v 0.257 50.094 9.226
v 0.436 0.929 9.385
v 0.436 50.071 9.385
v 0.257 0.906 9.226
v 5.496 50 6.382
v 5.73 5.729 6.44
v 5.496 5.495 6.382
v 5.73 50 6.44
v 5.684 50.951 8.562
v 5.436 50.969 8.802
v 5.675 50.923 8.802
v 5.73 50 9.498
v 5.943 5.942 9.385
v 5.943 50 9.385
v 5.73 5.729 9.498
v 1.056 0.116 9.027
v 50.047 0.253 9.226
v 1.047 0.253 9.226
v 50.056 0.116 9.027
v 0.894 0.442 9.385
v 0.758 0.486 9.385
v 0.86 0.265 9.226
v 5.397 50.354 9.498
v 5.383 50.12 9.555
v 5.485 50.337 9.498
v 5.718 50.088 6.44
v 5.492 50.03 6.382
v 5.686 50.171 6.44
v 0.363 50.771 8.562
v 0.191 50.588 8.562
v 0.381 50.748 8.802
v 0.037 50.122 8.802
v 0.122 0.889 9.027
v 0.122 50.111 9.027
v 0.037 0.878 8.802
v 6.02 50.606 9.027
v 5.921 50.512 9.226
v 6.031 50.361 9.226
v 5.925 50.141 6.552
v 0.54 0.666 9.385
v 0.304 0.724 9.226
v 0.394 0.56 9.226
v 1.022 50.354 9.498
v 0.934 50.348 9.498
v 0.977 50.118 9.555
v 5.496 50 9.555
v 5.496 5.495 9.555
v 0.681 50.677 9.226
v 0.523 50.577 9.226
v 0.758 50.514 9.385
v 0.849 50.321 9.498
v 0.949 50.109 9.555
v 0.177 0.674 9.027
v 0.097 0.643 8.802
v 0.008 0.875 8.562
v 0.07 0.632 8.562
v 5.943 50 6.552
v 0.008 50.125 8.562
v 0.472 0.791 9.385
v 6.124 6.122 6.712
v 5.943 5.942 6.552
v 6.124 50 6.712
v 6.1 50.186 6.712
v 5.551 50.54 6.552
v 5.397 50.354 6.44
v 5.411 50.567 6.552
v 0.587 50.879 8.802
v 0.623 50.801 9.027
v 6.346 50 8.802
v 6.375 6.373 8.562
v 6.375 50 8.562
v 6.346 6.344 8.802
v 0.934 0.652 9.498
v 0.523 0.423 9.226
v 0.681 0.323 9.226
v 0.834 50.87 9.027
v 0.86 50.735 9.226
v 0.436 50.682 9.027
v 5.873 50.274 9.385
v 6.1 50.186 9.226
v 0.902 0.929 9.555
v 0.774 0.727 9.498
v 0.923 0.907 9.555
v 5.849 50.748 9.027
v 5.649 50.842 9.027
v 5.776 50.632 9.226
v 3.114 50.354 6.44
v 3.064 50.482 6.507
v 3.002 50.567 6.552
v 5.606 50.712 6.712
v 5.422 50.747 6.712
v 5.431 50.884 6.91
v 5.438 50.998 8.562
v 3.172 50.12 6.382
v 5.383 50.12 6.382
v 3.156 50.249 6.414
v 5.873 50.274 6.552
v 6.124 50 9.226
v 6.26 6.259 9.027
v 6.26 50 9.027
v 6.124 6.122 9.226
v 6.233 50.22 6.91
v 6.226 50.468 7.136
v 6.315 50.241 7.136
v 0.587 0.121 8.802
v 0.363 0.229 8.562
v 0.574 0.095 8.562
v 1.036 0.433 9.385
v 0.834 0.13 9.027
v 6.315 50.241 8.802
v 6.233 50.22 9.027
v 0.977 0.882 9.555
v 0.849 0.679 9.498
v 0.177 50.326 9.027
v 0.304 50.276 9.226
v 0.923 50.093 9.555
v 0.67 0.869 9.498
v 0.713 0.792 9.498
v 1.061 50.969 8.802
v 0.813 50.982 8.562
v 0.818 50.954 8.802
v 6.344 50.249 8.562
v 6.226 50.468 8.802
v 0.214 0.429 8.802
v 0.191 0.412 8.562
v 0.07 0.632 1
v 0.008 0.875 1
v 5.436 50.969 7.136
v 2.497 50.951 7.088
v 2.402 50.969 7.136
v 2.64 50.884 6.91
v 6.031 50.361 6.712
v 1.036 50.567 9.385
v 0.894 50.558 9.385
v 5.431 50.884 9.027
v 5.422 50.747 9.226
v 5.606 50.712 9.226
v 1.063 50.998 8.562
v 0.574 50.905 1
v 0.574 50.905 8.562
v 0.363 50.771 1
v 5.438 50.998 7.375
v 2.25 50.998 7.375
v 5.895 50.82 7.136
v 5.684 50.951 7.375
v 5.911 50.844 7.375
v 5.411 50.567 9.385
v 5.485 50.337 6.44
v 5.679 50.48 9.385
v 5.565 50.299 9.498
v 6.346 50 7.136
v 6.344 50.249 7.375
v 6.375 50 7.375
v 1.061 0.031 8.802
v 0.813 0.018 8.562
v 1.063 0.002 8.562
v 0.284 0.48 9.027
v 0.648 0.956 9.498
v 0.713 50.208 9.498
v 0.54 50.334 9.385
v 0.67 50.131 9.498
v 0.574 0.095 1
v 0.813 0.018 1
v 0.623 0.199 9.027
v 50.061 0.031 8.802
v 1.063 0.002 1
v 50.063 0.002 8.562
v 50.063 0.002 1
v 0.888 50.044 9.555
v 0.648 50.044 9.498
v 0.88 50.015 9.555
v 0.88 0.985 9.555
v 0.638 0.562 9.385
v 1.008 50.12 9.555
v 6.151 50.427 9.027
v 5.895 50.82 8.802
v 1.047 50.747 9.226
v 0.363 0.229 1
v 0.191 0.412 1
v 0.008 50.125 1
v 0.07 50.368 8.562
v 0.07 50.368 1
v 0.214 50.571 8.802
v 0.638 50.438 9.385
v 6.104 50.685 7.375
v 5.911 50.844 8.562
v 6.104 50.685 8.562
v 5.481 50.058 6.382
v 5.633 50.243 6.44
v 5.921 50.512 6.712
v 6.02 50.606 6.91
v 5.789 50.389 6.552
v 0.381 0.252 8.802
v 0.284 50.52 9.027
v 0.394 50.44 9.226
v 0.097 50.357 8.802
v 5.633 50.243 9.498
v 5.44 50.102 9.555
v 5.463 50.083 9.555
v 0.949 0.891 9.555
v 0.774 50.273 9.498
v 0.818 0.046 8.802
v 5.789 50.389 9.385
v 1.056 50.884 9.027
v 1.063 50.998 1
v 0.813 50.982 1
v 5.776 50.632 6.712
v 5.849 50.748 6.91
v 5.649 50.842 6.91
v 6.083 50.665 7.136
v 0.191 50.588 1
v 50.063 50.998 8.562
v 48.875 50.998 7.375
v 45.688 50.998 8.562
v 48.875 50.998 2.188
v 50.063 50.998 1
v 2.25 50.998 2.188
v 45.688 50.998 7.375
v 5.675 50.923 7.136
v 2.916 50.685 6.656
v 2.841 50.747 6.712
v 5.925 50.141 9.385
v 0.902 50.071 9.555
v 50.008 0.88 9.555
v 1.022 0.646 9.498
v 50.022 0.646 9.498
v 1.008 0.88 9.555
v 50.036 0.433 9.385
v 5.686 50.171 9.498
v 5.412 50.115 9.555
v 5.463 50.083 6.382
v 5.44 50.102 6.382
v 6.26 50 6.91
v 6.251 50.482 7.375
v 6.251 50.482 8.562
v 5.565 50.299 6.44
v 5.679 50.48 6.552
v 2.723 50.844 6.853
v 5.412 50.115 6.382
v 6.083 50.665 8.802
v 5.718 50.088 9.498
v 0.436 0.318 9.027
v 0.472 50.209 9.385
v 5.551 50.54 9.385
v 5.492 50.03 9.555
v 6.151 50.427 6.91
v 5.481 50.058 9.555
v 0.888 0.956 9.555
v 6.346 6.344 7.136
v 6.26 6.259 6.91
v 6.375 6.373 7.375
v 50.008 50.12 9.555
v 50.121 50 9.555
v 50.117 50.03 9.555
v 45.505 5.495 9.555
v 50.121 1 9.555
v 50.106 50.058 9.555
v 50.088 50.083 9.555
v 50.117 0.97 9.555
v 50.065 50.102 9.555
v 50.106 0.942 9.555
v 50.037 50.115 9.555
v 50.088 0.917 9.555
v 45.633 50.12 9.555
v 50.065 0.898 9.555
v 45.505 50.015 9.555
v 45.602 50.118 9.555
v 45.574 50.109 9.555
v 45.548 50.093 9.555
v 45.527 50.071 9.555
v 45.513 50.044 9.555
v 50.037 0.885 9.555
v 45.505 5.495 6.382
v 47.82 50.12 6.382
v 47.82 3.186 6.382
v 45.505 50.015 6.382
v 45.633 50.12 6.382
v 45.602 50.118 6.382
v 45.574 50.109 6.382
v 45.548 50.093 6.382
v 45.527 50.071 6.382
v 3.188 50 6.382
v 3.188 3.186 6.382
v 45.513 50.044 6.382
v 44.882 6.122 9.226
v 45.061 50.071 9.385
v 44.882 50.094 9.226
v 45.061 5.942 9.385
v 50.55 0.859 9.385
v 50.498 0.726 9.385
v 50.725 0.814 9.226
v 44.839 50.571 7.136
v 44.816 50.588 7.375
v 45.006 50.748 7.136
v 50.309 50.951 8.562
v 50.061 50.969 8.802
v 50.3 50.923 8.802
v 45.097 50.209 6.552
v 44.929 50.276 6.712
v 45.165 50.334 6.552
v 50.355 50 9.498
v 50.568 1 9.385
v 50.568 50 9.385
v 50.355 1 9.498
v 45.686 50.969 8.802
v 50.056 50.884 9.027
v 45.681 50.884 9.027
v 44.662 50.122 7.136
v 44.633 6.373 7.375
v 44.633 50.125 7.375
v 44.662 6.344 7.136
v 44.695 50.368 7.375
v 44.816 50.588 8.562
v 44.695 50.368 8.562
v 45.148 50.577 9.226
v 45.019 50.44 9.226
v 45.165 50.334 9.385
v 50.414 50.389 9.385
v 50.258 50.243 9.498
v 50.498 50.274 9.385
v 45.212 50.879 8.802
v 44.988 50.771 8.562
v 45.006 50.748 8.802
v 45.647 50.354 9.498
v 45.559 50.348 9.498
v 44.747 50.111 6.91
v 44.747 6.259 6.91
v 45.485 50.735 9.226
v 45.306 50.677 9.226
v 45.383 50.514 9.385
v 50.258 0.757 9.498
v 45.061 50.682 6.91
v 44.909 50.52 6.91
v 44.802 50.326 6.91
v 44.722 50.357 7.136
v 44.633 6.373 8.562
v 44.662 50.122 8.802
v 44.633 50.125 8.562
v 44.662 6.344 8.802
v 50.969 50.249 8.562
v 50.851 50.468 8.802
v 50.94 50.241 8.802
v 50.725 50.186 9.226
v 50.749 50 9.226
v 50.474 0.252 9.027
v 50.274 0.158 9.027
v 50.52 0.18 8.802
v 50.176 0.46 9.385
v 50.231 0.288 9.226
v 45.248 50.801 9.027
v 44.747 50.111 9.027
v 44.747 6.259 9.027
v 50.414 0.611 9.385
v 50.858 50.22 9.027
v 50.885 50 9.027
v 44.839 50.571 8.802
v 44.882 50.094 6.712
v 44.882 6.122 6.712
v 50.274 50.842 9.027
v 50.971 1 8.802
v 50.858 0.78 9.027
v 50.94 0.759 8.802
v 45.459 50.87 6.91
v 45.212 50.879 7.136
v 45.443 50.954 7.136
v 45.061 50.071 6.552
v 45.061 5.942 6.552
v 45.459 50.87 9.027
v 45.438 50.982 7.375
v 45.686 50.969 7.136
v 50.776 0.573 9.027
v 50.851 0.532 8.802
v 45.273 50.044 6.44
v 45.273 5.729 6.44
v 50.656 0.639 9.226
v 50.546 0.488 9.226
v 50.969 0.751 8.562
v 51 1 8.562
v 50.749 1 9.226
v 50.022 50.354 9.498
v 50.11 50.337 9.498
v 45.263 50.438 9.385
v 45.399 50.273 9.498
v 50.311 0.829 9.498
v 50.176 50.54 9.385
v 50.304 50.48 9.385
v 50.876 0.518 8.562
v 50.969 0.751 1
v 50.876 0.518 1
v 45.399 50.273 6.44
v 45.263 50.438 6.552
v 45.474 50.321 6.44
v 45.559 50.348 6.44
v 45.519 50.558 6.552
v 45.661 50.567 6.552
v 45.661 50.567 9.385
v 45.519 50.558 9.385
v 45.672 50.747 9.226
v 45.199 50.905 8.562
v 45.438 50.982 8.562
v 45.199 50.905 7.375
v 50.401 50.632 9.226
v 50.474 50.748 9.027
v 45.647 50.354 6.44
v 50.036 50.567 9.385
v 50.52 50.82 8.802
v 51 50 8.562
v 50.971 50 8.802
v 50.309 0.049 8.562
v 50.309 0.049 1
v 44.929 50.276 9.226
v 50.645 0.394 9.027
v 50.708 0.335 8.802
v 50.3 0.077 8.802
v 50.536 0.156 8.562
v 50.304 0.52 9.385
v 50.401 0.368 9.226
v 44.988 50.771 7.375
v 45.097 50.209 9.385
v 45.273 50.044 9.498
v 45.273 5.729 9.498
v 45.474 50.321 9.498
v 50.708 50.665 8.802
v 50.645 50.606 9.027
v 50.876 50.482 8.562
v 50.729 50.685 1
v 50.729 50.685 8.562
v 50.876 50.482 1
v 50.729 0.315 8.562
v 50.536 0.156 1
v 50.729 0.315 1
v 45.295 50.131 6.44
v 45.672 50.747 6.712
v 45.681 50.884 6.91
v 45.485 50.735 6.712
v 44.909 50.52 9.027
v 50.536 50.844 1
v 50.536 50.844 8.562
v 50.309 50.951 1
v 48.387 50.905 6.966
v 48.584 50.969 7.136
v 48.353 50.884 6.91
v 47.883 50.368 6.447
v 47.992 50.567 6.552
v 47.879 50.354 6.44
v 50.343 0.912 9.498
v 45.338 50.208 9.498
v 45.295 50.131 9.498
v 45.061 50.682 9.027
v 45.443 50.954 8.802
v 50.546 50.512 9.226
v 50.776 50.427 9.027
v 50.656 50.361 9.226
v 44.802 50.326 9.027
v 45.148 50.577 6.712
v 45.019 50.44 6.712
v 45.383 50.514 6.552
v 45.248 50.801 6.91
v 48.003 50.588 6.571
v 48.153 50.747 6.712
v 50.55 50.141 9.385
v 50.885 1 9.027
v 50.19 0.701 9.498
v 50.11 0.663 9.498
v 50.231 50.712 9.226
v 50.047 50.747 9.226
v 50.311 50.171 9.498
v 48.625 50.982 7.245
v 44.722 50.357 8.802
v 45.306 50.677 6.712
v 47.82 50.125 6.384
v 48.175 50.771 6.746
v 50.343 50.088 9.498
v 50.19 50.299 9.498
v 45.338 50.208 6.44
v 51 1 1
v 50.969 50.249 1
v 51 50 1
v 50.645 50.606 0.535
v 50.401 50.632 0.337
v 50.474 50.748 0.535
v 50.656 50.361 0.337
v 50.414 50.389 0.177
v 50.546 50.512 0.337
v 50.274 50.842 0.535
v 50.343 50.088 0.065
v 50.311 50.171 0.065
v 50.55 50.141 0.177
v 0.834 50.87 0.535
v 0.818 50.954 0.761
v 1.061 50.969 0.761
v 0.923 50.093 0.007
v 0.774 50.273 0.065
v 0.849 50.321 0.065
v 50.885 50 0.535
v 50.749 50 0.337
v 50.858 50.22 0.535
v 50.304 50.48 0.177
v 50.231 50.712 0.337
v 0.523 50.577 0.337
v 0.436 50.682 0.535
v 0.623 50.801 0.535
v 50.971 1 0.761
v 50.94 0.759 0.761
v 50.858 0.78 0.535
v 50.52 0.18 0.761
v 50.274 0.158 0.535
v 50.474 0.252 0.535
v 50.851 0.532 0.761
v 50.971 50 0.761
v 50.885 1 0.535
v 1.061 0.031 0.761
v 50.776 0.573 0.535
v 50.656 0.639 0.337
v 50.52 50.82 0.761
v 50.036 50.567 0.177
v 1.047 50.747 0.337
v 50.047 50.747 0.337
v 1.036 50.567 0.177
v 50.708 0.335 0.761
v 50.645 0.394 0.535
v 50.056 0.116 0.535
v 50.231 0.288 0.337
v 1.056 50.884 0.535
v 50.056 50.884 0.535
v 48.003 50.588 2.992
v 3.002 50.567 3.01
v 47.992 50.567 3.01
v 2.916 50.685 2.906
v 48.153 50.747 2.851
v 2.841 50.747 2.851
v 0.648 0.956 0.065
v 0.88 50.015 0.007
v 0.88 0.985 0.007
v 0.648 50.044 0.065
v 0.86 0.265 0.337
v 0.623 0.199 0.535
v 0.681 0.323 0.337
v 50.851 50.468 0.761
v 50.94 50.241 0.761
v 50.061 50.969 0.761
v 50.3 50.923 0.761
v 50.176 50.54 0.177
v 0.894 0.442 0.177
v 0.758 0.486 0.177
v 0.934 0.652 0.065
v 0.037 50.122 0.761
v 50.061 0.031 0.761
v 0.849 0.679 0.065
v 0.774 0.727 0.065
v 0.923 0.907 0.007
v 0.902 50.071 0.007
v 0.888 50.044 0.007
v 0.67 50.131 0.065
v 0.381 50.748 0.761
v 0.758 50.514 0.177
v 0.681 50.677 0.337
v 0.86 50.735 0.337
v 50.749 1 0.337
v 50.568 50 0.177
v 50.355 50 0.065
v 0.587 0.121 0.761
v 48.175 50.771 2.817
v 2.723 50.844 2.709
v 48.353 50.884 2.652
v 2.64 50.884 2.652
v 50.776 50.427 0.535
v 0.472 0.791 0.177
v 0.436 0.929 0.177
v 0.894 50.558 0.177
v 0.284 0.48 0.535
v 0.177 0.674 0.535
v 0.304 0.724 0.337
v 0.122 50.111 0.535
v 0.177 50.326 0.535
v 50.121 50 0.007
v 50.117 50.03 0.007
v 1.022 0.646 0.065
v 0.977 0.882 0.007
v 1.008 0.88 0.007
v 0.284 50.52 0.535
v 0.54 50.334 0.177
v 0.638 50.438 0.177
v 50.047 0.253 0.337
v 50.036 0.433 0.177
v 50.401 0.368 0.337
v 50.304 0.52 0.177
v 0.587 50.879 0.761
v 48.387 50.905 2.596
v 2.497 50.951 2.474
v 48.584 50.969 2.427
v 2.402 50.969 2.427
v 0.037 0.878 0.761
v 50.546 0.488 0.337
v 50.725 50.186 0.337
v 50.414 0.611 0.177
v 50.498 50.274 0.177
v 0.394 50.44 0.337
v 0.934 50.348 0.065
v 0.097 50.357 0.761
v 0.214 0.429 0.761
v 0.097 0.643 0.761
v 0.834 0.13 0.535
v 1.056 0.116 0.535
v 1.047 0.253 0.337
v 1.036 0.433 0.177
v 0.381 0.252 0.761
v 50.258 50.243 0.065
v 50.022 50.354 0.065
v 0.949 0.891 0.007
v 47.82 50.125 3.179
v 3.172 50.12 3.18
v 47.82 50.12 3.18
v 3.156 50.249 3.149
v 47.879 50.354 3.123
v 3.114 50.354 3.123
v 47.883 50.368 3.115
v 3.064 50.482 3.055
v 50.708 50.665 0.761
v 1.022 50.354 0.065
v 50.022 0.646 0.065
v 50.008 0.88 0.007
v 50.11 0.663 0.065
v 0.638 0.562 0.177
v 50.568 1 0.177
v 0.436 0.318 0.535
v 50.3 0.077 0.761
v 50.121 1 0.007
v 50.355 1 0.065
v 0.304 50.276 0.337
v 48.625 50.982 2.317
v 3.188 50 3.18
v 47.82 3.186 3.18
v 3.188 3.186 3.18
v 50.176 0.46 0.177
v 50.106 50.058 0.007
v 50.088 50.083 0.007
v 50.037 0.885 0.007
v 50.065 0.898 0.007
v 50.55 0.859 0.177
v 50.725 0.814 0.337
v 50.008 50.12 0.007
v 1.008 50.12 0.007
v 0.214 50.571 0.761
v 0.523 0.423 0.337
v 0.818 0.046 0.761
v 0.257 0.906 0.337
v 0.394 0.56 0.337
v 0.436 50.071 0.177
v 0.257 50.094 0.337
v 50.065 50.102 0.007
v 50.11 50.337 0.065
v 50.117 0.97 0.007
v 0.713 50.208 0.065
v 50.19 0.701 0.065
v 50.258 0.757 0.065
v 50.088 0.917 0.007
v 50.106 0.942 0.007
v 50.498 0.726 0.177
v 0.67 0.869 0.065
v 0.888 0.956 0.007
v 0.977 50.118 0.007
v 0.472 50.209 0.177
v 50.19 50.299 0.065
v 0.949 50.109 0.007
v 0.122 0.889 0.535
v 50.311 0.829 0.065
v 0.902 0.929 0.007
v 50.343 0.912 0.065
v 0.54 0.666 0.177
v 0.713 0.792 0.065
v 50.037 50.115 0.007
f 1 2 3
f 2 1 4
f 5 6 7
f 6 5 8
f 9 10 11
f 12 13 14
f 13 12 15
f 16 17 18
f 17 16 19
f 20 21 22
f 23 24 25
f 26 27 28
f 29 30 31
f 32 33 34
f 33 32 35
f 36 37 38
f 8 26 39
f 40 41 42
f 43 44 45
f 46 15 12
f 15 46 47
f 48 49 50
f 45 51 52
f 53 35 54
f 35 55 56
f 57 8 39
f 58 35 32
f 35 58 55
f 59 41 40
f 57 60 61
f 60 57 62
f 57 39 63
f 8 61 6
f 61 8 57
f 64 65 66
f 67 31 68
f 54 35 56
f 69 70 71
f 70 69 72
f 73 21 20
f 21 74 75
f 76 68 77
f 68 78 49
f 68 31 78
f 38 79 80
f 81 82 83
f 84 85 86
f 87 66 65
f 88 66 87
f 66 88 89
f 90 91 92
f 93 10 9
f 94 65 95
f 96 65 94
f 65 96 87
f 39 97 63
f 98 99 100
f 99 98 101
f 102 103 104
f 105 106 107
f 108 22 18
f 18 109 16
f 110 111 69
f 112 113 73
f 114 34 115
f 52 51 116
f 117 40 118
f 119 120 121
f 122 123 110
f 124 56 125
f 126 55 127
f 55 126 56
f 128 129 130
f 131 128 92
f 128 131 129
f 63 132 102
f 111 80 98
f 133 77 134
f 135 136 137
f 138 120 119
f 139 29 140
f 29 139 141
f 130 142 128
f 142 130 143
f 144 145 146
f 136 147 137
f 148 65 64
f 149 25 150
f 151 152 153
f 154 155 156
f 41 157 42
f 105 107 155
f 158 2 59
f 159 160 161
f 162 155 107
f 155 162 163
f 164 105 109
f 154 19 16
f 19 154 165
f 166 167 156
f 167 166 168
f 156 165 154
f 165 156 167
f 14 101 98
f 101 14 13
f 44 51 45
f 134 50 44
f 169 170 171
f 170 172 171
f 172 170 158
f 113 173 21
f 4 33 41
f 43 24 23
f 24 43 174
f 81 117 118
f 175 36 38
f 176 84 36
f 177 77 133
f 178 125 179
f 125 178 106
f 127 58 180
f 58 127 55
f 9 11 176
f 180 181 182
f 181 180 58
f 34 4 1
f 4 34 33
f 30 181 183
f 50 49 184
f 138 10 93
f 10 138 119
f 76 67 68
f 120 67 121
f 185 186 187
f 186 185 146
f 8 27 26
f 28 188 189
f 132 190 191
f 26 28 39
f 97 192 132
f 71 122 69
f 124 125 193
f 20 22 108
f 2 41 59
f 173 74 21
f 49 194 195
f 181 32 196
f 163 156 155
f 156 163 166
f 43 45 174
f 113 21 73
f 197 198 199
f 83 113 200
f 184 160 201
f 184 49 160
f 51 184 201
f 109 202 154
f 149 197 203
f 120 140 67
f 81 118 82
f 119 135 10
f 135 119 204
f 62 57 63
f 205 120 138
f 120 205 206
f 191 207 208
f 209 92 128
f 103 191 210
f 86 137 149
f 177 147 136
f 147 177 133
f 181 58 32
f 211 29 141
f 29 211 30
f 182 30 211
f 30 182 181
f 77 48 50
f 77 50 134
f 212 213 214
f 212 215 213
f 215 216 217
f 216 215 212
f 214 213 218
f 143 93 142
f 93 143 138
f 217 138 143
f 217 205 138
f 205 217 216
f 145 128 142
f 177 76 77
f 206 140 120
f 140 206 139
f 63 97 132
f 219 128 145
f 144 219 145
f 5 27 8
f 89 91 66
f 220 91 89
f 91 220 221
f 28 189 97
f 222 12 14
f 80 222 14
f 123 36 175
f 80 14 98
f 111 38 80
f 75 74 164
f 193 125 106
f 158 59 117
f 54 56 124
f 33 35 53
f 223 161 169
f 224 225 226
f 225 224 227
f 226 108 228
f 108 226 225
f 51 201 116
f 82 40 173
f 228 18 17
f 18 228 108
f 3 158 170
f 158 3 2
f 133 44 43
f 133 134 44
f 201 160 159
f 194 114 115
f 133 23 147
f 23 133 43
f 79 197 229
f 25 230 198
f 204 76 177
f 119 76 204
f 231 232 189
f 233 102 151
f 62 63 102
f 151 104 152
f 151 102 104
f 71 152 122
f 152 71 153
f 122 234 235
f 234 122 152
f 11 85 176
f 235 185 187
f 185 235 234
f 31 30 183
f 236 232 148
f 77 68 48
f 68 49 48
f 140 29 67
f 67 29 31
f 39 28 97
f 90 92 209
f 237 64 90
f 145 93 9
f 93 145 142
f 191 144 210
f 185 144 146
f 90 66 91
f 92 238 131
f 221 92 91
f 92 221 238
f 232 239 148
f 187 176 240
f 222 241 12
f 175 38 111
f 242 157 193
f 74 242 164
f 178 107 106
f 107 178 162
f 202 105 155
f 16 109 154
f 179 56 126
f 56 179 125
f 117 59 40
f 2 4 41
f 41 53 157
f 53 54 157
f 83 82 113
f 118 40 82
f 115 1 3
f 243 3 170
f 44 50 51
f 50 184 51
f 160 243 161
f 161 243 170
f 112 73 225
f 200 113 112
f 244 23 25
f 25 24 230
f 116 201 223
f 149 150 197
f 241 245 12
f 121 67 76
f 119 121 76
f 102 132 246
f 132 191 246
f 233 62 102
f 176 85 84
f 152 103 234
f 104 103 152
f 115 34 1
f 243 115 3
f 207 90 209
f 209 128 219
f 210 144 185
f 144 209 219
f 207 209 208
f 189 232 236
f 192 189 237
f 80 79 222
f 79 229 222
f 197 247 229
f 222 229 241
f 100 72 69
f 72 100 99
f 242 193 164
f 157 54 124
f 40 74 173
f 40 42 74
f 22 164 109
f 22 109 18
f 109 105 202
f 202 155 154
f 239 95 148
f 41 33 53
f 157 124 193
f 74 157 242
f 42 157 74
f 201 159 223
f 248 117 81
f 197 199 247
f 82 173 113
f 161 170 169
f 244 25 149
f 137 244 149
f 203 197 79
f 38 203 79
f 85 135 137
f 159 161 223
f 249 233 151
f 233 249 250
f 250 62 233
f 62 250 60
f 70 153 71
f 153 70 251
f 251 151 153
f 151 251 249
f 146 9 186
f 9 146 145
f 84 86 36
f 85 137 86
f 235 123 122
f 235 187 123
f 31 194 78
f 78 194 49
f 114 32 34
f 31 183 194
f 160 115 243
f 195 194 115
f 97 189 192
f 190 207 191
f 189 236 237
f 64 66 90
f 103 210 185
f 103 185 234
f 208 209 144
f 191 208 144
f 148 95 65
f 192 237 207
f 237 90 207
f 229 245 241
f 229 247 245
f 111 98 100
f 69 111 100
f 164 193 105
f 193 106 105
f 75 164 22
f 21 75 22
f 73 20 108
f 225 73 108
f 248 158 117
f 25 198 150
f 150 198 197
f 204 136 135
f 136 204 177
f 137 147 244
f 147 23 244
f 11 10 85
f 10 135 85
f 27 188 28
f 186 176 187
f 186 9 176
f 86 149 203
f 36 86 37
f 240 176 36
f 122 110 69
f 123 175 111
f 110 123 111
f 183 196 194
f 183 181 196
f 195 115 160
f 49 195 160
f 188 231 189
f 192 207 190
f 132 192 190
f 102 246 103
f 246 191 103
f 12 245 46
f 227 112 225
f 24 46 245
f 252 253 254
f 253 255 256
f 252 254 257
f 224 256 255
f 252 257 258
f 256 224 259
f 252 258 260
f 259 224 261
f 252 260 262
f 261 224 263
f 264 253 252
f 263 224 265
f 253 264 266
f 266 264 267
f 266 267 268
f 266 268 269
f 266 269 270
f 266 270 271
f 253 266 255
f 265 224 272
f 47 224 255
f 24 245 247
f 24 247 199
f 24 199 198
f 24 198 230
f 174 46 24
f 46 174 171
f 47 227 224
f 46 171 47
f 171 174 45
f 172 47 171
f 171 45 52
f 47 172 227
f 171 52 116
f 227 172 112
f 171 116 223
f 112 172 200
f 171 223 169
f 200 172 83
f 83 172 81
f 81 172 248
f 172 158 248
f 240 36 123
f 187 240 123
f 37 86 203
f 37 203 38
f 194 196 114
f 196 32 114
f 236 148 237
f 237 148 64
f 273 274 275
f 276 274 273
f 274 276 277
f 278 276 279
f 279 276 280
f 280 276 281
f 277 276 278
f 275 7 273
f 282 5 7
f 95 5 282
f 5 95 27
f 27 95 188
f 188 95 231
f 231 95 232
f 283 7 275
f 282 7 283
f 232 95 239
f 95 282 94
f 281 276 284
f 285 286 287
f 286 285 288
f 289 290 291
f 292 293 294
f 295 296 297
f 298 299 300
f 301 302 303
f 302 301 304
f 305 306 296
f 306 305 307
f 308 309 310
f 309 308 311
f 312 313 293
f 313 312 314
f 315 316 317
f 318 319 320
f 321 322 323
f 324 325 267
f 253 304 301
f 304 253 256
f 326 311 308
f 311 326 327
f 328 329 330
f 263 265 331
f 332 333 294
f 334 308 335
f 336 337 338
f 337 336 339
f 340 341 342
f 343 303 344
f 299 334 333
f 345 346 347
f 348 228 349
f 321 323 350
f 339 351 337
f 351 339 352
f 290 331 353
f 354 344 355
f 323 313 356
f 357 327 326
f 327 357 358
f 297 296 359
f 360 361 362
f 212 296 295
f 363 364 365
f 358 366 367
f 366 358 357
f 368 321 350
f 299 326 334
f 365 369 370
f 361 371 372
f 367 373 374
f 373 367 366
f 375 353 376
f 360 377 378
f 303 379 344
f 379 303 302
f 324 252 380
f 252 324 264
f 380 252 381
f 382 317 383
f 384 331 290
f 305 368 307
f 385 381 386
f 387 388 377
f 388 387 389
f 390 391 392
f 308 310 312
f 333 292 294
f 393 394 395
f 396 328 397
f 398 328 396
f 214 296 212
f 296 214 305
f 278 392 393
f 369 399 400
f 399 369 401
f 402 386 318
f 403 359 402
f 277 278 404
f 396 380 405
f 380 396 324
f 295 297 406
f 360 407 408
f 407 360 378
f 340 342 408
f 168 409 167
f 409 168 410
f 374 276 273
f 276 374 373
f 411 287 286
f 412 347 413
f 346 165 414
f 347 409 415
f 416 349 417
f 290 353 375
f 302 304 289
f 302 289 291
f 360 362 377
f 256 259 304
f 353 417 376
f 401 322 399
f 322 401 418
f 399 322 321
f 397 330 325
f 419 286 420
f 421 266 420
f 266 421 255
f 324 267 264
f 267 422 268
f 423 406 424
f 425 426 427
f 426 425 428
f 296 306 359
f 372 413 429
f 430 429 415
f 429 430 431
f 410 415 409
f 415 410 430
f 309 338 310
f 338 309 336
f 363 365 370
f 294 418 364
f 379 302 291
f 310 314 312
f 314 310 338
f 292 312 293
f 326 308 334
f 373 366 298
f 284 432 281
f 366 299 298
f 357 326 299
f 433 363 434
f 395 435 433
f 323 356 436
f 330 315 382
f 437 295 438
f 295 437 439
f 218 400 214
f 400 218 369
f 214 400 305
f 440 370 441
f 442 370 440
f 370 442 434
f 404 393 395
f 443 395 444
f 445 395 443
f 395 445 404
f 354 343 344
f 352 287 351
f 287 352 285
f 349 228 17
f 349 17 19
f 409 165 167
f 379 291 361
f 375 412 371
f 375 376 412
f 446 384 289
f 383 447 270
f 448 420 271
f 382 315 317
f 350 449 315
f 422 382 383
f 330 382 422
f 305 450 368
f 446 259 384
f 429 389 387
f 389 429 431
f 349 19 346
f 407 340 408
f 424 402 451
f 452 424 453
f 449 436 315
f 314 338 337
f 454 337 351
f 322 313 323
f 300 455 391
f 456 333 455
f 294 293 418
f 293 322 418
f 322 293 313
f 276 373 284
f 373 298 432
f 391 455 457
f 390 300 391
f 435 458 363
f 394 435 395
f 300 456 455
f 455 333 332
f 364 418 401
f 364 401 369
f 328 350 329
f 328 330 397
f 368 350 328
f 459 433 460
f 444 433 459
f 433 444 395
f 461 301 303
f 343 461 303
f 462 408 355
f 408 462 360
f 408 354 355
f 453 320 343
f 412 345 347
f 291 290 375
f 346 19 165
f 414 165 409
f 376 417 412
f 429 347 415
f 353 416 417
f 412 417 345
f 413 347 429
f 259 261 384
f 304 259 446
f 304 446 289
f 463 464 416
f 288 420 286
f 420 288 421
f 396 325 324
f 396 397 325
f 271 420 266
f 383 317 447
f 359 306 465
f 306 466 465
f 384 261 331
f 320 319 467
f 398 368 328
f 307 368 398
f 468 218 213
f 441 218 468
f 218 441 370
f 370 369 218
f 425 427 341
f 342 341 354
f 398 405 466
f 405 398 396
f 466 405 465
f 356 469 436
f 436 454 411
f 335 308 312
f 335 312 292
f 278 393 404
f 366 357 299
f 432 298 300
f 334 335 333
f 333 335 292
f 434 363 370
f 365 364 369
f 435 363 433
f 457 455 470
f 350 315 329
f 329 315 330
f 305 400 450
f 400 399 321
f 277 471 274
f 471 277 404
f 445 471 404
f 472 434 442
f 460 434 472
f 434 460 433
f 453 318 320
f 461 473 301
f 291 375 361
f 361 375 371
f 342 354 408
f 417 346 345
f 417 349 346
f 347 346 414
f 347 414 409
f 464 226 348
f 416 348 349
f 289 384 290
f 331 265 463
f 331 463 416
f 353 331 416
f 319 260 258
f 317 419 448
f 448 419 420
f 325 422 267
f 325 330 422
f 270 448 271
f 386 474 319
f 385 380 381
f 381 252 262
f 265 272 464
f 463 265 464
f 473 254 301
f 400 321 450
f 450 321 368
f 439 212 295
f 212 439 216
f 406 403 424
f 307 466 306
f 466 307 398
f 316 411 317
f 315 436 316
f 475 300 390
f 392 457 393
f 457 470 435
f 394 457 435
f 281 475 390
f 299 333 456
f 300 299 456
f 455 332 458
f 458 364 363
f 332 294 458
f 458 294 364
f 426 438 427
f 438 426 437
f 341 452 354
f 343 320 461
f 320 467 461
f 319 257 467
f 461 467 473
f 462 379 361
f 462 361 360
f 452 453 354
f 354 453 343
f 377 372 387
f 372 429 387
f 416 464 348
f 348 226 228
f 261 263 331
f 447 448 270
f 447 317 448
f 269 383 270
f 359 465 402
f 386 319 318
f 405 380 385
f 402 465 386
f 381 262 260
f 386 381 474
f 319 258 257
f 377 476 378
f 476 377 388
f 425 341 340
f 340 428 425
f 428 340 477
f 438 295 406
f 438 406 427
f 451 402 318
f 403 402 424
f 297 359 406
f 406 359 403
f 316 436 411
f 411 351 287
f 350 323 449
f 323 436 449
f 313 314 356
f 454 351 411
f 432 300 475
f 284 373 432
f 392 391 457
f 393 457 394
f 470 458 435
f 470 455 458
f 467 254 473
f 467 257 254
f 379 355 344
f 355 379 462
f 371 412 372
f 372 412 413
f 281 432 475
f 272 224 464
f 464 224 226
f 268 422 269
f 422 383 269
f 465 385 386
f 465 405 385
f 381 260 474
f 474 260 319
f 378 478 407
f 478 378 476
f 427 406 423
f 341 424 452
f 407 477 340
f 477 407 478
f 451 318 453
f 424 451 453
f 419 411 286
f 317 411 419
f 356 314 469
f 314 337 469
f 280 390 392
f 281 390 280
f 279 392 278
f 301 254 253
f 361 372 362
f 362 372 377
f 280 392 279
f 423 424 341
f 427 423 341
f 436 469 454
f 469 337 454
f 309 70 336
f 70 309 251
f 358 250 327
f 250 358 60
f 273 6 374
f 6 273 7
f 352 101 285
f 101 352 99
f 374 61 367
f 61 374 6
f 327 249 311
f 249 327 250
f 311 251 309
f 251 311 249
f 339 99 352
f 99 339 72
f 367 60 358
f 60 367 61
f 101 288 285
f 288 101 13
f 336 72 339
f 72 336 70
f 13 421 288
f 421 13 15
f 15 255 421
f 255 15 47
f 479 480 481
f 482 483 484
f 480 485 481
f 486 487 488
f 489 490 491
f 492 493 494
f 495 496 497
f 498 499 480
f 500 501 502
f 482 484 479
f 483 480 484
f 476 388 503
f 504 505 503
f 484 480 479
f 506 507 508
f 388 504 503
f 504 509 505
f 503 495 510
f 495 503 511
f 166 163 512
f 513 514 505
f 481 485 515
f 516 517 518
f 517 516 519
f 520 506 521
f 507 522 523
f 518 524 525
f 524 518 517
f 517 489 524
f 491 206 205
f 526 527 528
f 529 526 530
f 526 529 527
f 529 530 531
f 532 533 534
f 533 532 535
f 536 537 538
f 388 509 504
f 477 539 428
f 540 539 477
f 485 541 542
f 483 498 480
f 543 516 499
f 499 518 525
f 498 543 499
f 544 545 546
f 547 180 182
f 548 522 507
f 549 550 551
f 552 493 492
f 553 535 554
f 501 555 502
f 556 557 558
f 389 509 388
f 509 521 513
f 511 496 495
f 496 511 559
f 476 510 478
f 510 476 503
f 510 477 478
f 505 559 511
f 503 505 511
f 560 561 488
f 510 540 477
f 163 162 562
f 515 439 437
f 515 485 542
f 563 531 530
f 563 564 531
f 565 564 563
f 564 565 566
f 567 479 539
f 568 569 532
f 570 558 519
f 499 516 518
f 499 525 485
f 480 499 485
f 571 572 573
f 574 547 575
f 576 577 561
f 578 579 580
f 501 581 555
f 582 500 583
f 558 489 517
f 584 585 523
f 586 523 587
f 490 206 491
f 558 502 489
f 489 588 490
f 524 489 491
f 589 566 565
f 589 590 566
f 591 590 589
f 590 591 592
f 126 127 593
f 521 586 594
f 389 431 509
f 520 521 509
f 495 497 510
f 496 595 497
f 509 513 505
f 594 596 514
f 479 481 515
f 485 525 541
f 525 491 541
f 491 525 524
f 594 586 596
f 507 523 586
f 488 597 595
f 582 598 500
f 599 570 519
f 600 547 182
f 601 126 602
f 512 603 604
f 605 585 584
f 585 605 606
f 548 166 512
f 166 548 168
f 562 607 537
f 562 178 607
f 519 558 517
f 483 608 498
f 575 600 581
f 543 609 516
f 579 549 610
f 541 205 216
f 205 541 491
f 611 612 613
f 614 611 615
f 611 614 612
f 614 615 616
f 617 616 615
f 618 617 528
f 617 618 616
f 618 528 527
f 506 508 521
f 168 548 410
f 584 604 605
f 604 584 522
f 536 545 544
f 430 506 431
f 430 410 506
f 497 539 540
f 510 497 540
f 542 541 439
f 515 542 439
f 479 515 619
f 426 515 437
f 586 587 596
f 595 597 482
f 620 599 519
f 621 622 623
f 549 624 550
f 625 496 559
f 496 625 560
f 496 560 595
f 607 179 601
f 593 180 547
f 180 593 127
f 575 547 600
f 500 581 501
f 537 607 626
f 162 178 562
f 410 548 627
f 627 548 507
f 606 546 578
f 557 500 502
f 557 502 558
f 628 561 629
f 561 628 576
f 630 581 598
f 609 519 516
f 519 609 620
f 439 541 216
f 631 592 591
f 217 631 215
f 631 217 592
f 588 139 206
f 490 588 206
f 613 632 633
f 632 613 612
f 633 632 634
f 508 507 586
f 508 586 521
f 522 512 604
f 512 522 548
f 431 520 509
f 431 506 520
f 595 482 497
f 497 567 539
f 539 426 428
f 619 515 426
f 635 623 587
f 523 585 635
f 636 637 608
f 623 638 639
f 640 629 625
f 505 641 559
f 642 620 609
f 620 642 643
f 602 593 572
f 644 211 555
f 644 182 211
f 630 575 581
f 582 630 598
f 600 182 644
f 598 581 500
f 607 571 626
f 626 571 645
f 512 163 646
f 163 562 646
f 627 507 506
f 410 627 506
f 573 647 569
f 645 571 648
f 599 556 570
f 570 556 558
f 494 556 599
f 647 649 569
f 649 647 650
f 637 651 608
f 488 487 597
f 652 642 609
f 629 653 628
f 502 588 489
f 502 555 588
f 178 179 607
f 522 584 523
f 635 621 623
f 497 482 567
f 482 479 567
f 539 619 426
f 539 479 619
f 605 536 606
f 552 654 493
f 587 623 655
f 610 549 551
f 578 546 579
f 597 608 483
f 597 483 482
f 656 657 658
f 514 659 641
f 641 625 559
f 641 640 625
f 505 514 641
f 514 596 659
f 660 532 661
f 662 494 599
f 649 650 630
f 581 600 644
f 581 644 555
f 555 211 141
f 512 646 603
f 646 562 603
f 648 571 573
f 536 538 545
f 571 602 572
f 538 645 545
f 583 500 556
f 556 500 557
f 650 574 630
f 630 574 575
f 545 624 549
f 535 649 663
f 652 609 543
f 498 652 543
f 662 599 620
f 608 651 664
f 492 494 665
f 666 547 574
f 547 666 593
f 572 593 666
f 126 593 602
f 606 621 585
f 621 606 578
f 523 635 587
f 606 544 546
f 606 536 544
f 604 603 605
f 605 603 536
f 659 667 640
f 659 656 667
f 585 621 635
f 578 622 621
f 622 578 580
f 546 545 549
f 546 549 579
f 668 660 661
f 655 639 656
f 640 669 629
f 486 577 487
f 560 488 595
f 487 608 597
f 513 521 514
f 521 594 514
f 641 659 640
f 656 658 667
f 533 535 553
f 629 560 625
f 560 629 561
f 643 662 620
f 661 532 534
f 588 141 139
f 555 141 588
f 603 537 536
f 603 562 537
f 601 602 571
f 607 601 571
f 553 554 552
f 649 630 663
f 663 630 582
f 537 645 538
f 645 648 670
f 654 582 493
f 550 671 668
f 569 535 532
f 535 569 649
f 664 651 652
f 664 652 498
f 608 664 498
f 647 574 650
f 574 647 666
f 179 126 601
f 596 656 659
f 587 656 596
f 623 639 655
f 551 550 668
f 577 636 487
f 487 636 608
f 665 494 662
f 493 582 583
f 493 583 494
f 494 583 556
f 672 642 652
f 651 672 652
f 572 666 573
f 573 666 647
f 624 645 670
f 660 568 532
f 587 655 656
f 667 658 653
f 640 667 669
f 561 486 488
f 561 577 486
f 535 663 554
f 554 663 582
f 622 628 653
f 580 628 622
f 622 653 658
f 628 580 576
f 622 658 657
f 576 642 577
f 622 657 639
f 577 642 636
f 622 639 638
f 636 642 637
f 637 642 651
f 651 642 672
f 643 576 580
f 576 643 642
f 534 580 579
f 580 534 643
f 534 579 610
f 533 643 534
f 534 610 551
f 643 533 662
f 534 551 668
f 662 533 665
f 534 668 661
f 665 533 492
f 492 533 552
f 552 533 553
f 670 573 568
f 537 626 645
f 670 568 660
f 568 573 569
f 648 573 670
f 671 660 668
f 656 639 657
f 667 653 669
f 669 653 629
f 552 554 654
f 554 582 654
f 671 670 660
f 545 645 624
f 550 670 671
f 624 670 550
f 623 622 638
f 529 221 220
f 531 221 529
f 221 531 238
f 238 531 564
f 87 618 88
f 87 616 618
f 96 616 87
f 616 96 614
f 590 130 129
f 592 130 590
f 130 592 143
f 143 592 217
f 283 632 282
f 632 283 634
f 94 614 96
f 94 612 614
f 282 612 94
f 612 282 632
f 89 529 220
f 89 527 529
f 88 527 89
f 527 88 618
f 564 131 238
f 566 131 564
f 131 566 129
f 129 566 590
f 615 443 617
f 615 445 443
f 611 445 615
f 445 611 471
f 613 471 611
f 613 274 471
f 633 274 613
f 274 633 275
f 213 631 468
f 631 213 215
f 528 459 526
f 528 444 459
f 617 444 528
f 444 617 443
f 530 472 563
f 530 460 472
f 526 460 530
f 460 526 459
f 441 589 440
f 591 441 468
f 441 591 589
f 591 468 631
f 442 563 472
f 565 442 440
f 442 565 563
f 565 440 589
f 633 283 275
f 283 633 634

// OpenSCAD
// file: lib/cover.scad
//fine = true; 
fine = false; 

$fn = fine ? 100 : 25;

roundcorner = 2; 

horn_arc = 45;

horn_diameter = 5;

base_size = 25.5;
plate_thickness = base_size / 8;




module bar(roundcorner = 1, x = base_size, y = base_size, z = plate_thickness, color = "purple") {
    translate([roundcorner, roundcorner, roundcorner]) {
        color(color) {
            minkowski() {
                cube([x - (roundcorner * 2), y - (roundcorner * 2), z - (roundcorner * 2)]);
                sphere(d = roundcorner * 2);
            }
        }
    }
}



    
module cover(x_ness = 1, y_ness = 1) {

    // base plate
    bar(x = base_size * x_ness, y = base_size * y_ness, z = plate_thickness);

    // sides
    bar(color = "green", x = plate_thickness, y = base_size * y_ness, z = plate_thickness * 3);
    translate([(base_size * x_ness) - plate_thickness, 0, 0]) 
        bar(color = "red", x = plate_thickness, y = base_size * y_ness, z = plate_thickness * 3);
    bar(color = "blue", x = base_size * x_ness, y = plate_thickness, z = plate_thickness * 3);
    
    // cover
    translate([0, 0, plate_thickness * 2]) {
        bar(color = "grey", x = plate_thickness * 2, y = base_size * y_ness);
        translate([(base_size * x_ness) - (plate_thickness * 2), 0, 0]) 
            bar(color = "black", x = plate_thickness * 2, y = base_size * y_ness);
        bar(color = "white", x = base_size * x_ness, y = plate_thickness * y_ness);

    }

}
// main file
fine = true;
//fine = false;

$fn = fine ? 100 : 25;



base_size = 25.5;
plate_thickness = base_size / 8;



use <lib/cover.scad>;

cover(2, 2, 0.2);
